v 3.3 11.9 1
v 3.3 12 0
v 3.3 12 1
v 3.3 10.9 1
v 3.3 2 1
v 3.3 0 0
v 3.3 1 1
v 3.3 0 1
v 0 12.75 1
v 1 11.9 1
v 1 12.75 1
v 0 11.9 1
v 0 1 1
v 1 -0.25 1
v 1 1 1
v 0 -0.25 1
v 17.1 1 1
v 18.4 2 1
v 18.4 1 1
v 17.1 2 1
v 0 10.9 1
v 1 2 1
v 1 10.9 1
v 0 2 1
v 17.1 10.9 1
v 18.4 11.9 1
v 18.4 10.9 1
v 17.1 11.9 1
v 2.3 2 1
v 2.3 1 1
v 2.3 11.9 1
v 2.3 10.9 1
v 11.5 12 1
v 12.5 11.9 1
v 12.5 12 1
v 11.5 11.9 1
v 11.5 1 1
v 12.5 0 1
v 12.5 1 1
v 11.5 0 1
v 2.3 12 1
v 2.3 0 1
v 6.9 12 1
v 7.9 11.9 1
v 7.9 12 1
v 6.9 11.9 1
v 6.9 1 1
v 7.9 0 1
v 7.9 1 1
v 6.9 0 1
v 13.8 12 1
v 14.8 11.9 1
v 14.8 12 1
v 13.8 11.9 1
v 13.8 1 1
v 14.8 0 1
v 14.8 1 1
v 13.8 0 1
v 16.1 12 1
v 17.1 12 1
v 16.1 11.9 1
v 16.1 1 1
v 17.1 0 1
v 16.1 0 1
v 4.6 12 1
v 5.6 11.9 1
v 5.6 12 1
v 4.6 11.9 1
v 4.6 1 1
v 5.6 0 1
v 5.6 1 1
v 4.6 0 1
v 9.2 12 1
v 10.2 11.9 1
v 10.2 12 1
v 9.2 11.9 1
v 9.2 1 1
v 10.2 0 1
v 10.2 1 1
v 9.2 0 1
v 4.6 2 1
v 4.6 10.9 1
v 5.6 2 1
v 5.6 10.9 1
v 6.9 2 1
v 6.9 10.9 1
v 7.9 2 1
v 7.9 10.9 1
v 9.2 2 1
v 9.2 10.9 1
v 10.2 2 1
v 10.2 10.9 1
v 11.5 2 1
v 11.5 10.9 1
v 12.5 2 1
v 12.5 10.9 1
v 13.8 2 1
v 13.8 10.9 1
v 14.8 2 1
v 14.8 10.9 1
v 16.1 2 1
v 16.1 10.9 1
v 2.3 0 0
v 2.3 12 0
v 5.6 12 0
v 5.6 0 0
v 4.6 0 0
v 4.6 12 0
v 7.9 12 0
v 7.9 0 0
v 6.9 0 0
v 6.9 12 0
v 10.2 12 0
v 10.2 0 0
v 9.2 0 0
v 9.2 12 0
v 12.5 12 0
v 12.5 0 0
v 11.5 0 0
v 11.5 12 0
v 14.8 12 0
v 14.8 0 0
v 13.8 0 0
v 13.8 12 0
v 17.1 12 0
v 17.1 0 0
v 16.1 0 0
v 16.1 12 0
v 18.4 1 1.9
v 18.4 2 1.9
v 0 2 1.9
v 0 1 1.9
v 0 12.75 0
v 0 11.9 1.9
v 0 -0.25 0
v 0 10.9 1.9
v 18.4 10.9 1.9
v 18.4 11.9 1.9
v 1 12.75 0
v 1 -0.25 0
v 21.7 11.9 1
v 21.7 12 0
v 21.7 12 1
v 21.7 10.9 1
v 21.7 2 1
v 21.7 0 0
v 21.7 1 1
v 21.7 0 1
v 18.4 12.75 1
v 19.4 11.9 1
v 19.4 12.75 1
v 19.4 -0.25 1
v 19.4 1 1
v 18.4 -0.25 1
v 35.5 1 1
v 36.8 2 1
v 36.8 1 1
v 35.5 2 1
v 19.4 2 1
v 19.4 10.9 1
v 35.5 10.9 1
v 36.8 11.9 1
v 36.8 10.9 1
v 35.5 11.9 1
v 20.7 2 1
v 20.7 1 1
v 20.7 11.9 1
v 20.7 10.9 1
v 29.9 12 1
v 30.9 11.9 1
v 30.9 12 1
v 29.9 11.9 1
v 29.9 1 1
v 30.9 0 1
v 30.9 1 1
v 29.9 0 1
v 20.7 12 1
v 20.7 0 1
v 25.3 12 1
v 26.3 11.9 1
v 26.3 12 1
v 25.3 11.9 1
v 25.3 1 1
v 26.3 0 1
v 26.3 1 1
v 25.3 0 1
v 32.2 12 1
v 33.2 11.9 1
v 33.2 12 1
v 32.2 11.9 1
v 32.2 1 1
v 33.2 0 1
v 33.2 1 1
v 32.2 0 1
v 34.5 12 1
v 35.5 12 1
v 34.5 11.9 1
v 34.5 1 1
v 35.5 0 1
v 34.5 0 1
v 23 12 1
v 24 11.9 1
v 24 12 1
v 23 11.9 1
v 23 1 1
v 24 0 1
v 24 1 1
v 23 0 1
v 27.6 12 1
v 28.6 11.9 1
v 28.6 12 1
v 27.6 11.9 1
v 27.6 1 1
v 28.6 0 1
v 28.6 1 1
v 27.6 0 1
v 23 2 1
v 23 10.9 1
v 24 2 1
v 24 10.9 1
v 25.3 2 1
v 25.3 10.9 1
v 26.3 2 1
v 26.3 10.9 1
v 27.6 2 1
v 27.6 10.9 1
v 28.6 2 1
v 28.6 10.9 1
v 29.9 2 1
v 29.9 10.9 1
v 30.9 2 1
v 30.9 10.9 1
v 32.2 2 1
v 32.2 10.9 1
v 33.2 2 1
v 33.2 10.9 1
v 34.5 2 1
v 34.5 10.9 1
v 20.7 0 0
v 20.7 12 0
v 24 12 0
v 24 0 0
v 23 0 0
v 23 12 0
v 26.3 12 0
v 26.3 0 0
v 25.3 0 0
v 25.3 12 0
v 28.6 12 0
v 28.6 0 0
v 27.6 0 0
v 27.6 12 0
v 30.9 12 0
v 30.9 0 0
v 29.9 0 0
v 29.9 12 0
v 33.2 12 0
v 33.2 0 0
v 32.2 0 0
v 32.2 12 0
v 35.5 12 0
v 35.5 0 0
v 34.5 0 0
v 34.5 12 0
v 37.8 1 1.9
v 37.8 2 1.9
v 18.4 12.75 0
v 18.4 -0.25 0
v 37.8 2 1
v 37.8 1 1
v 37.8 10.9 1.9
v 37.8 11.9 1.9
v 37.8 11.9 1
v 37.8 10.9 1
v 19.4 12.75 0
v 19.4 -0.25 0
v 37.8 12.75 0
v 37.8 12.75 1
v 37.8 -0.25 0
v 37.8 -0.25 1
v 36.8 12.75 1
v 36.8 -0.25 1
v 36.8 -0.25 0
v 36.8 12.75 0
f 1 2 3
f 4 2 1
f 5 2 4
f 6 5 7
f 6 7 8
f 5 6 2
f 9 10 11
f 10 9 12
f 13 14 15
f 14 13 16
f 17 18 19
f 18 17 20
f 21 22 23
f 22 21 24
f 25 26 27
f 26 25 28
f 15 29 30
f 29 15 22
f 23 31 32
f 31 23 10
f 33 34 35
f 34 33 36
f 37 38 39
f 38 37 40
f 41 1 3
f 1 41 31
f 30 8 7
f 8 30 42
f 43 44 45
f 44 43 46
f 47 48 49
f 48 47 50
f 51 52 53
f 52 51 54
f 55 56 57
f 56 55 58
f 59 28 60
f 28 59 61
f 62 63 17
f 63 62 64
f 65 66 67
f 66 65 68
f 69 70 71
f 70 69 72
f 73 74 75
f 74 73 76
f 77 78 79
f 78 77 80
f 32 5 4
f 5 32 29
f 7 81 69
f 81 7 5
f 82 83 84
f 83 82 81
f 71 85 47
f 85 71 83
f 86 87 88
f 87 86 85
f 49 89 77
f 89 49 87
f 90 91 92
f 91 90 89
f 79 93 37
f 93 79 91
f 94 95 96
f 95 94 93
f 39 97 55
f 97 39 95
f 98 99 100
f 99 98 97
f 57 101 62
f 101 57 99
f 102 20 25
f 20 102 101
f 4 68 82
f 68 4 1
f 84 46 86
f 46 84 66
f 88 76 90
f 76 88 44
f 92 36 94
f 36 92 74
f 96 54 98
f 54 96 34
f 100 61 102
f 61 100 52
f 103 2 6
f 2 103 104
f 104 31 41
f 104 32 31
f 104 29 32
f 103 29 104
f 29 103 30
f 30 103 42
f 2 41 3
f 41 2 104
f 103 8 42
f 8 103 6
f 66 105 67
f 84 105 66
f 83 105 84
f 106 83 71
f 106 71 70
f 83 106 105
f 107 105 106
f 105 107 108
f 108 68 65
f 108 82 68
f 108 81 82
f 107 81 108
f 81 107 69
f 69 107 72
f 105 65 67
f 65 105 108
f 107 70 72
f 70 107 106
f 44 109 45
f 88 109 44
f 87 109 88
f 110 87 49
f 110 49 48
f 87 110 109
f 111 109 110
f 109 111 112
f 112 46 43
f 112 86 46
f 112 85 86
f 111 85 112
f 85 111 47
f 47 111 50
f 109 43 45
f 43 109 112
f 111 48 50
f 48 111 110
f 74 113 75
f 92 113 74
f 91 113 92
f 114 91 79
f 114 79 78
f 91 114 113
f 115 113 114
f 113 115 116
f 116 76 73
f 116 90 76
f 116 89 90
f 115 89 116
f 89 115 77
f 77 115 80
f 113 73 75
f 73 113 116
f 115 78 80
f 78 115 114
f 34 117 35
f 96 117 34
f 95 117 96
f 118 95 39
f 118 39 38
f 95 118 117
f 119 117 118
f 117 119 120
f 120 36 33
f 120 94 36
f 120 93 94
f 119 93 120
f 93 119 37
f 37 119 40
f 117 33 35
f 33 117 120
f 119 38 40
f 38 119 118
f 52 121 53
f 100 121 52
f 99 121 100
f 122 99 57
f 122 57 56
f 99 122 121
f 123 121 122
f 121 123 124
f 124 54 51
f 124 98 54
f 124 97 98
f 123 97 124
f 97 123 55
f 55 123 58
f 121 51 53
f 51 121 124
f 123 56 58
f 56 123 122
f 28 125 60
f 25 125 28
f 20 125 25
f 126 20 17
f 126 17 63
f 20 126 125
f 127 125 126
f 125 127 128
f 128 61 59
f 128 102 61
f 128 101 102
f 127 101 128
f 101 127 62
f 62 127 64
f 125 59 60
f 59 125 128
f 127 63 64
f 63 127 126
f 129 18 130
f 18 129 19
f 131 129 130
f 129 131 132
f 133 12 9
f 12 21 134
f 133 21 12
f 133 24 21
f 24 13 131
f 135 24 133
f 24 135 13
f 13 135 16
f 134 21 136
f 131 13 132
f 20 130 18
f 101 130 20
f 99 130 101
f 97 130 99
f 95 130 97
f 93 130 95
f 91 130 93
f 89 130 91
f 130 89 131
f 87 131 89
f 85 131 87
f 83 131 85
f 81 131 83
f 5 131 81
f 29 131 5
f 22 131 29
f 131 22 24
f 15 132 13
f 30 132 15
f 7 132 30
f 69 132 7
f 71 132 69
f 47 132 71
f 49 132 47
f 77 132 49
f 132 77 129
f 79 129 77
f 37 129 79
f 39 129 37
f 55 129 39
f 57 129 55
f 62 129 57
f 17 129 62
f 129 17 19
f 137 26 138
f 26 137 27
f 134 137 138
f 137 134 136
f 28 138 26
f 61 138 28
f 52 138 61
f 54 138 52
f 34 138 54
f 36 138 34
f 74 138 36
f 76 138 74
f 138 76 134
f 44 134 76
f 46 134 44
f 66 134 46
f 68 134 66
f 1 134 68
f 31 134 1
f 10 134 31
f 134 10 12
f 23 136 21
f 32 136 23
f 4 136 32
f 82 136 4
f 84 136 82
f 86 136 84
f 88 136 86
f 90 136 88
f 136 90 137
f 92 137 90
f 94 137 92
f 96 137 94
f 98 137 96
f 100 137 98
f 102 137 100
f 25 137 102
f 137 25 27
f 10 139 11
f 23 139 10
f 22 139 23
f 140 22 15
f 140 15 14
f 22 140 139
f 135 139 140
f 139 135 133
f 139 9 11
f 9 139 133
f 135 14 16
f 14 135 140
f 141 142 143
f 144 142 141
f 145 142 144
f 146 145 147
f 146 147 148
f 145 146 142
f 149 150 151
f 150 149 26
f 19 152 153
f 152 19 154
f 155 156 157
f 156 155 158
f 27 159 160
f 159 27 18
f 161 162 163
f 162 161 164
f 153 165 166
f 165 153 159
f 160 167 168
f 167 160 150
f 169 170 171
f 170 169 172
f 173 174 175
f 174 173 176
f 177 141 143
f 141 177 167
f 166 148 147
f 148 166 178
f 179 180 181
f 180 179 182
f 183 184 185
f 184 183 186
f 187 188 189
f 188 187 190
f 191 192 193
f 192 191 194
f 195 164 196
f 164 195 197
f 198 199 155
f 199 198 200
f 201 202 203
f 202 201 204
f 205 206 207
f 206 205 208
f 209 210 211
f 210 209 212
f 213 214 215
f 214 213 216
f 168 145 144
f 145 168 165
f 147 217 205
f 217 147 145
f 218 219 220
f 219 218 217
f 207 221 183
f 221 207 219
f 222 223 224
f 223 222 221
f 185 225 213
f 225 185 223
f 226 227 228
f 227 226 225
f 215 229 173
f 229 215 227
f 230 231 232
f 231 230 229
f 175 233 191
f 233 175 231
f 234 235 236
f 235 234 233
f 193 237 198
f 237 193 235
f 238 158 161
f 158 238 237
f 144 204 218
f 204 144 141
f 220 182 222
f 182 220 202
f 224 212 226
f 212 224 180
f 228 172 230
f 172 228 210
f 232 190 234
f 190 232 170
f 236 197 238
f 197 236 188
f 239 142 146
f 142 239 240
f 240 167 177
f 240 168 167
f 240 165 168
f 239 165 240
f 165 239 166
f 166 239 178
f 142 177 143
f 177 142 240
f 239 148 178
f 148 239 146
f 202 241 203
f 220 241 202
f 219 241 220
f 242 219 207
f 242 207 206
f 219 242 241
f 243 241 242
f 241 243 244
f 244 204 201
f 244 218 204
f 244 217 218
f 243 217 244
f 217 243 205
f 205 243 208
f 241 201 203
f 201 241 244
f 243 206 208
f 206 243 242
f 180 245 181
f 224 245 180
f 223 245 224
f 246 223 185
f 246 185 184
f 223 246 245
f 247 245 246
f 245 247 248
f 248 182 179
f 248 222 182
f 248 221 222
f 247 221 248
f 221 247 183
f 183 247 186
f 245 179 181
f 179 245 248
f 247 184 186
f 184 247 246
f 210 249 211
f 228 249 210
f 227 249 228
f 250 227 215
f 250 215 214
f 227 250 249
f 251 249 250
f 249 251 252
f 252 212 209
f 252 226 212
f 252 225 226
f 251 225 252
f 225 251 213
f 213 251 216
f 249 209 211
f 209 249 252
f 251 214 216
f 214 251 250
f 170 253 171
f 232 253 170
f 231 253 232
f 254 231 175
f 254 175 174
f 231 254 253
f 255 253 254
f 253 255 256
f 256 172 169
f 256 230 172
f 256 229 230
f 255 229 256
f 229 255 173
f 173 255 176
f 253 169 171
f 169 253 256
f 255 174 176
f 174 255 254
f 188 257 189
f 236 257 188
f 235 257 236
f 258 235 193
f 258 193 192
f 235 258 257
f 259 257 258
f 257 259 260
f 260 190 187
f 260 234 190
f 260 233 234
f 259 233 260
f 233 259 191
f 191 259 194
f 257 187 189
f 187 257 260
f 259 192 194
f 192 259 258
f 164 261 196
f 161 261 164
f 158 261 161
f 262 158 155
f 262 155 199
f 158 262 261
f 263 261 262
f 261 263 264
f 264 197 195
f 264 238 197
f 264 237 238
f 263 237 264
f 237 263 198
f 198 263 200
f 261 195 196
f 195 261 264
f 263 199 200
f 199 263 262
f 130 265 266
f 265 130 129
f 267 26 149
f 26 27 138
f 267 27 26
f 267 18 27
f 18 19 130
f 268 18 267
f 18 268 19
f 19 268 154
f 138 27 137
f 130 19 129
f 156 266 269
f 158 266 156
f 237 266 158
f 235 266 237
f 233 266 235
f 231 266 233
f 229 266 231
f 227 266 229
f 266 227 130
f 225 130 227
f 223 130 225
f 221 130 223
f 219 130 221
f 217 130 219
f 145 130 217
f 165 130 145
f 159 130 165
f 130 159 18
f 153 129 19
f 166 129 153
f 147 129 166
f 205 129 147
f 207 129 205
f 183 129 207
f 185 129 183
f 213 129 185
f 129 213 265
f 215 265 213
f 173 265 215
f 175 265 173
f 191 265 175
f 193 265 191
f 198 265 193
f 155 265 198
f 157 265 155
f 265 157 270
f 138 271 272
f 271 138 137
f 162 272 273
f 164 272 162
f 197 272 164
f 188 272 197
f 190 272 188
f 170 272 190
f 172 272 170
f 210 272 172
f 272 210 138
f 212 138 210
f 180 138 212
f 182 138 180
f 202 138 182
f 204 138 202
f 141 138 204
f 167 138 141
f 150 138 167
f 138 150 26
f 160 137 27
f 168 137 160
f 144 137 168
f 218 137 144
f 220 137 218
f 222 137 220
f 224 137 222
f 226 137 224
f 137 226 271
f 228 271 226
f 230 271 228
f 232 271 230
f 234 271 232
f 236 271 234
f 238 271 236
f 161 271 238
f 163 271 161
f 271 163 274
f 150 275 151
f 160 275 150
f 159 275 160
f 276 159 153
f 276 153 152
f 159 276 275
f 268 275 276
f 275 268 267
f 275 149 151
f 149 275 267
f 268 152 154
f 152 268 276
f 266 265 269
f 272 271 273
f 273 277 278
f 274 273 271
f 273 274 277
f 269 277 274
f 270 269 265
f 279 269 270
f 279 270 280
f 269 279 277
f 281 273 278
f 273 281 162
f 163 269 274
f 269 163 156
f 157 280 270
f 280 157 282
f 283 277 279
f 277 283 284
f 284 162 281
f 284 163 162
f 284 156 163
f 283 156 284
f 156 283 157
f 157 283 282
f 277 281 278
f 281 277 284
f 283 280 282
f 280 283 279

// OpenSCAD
//
//	Customizable Fence for N Scale Model Railroads
//	Steve Medwin
//	April 12, 2014
// 

// preview[view:north, tilt:bottom]

Nslats=8*1;
width=1*1;
height=12*1;
depth=1*1;
spacing=2.3*1;
bar_depth=depth-.1;
// How many fence sections?
number_sections=2; // [1:20]



module fence() {
// vertical slats
	for (i=[1:Nslats-1]){
		translate([i*spacing,0,0]) cube([width,height,depth]);
		}

// horizontal bars
	translate([0,1,depth]) cube([Nslats*spacing,width,bar_depth]);
	translate([0,height-1.1,depth]) cube([Nslats*spacing,width,bar_depth]);

// vertical post
	translate([0,,-0.250]) cube([width,height+1,depth]);
}

// make fence
for (j=[0:number_sections-1]) {
	translate ([j*Nslats*spacing,0,0]) fence();
}

// end the row of fences
// vertical post
	translate([number_sections*Nslats*spacing,-0.25,0]) cube([width,height+1,depth]);

// horizontal bars
	translate([number_sections*Nslats*spacing,1,depth]) cube([width,width,bar_depth]);
	translate([number_sections*Nslats*spacing,height-1.1,depth]) cube([width,width,bar_depth]);

